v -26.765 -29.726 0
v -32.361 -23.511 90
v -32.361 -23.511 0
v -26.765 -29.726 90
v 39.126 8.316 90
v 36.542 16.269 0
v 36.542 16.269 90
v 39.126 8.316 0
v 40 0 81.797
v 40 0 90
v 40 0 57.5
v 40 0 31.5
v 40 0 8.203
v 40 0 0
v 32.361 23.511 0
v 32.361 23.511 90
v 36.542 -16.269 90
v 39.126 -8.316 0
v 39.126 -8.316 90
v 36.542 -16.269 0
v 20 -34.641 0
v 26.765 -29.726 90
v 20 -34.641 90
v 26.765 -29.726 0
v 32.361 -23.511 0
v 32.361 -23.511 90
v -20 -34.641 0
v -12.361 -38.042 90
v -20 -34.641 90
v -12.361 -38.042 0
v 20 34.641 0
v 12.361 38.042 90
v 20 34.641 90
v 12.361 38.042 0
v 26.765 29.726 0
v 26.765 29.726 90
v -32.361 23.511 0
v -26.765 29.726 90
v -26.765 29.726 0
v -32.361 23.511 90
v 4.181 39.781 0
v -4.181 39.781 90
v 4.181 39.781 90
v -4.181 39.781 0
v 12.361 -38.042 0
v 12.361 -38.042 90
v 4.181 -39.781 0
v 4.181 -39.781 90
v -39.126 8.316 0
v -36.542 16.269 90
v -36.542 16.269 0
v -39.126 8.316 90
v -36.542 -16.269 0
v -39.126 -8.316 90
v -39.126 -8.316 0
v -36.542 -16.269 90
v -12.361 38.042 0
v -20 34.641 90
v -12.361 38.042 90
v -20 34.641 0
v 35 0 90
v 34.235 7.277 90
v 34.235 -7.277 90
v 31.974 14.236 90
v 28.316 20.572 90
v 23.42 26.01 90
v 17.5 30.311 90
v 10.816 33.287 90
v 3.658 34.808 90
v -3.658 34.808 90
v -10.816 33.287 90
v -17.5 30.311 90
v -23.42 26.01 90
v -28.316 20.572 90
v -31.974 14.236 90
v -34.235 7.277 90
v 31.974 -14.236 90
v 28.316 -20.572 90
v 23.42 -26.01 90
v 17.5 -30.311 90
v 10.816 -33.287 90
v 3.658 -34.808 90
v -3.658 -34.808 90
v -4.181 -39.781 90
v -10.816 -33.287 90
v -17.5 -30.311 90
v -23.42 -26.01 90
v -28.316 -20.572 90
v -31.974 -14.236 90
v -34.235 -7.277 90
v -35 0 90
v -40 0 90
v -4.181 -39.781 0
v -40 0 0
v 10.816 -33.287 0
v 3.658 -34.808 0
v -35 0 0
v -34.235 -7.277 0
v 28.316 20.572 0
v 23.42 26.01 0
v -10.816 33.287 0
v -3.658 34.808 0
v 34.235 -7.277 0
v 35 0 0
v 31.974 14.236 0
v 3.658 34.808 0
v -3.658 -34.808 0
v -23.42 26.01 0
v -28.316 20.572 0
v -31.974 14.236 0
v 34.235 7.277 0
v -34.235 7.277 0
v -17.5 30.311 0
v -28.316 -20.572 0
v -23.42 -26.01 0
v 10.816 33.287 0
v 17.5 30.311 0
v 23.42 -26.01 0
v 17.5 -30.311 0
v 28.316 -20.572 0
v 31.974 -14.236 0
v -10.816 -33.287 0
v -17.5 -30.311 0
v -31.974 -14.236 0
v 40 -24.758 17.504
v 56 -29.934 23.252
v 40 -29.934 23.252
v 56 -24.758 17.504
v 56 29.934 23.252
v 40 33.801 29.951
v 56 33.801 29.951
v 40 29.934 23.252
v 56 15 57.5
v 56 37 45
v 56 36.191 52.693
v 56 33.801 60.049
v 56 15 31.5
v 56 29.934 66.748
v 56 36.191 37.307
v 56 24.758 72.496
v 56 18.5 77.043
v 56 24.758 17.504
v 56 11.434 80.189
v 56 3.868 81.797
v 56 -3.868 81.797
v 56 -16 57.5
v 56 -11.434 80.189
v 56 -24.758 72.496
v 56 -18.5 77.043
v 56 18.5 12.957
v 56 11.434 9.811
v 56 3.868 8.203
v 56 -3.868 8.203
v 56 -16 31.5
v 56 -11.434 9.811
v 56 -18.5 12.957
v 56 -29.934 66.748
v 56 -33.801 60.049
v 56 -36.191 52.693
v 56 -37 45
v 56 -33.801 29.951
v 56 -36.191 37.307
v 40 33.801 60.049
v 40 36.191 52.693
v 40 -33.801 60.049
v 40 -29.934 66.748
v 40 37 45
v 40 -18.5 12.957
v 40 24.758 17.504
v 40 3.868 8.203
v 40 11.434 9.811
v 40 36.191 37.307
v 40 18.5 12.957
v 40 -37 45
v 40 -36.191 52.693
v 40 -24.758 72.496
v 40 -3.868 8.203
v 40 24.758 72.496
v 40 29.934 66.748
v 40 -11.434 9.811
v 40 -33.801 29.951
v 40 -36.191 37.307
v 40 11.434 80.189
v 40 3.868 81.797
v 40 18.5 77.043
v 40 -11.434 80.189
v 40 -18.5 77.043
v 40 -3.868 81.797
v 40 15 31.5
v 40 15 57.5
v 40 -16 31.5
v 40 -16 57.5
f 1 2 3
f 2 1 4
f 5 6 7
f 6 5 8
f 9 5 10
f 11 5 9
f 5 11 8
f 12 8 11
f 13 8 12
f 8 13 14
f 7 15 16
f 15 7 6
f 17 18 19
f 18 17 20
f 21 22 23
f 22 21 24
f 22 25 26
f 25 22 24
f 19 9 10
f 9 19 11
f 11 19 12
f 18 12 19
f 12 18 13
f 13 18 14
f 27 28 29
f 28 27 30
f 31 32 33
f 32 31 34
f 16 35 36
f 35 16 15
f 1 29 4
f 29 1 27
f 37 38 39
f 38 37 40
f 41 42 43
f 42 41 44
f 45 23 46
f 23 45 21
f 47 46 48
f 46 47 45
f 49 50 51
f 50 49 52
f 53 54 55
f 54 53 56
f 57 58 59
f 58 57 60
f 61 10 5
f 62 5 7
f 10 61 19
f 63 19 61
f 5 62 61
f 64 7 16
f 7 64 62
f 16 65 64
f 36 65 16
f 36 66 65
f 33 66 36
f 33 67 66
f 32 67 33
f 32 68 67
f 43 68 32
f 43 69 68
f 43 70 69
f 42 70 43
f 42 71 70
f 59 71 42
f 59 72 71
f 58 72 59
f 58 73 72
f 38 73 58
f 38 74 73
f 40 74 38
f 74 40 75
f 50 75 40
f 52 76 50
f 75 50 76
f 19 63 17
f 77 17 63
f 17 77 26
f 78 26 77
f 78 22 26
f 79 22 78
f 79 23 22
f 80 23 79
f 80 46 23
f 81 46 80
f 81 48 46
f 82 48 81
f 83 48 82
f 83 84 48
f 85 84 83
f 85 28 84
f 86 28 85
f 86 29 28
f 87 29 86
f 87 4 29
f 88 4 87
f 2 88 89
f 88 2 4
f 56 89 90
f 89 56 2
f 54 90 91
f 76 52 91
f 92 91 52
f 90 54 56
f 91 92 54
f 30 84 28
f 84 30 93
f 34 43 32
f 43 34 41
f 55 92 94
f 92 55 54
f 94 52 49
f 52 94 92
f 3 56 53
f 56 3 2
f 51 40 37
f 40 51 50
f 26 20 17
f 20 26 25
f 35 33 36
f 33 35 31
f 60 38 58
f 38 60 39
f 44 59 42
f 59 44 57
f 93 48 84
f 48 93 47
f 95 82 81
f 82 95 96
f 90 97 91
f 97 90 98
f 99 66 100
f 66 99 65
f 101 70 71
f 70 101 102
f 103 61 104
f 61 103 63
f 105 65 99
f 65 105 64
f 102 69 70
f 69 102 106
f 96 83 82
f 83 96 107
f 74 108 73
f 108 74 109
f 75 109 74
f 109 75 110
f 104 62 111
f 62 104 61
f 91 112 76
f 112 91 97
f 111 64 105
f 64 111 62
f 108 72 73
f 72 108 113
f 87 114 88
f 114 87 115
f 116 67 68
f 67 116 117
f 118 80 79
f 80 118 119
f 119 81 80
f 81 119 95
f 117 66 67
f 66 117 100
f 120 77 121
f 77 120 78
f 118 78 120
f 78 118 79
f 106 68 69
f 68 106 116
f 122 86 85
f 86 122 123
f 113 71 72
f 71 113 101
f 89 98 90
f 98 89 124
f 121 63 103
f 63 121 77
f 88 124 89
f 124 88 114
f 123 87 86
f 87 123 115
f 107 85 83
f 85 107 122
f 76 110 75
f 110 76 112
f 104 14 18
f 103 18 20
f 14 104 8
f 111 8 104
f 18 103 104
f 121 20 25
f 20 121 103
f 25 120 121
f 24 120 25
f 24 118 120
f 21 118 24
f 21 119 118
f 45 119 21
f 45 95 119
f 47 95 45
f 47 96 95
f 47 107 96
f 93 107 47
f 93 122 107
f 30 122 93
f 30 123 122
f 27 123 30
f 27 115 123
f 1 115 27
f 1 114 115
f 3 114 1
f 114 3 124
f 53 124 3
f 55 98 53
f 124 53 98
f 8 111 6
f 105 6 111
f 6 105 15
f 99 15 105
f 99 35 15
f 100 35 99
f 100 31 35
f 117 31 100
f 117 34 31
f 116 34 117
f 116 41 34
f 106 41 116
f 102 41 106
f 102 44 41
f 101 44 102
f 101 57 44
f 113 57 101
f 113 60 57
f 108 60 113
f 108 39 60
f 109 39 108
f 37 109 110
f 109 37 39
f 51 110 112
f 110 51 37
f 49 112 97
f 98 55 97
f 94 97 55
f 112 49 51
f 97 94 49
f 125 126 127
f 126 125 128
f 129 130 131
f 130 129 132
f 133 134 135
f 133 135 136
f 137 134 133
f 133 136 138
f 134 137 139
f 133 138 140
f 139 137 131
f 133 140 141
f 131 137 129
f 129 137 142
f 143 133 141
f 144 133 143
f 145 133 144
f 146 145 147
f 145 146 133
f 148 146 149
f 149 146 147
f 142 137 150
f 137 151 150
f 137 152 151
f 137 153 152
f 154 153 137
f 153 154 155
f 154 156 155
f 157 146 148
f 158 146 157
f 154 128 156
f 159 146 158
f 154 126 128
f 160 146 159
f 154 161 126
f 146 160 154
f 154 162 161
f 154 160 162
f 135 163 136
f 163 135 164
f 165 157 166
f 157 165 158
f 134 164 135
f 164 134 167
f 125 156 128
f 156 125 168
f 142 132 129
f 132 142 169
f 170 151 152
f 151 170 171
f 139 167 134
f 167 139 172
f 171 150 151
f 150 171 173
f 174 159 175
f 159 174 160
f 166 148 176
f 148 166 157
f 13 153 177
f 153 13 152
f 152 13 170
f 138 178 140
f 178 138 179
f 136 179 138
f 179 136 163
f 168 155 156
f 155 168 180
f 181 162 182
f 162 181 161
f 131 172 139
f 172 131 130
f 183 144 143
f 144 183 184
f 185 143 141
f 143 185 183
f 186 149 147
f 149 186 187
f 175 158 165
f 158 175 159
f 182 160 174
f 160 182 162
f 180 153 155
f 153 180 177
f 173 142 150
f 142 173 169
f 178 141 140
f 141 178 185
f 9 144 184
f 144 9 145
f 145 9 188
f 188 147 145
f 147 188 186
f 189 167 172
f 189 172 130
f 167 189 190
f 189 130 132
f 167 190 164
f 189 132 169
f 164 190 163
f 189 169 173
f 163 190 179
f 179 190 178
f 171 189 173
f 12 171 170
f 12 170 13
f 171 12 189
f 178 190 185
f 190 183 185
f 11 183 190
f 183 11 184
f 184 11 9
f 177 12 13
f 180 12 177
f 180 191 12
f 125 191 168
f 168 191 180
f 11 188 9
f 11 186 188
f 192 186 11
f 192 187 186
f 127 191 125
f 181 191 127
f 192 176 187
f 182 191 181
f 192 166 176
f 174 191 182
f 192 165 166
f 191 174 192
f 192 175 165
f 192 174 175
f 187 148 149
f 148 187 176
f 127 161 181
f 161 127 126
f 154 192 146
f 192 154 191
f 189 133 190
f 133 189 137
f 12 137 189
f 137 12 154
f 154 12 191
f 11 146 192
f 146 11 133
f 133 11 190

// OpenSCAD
// =========================================
// OpenSCAD Mug Design (Specified Orientation)
// =========================================

// --- Global Dimensions ---
MUG_OD = 80;      // Outer Diameter of Mug (mm)
MUG_RD = MUG_OD / 2; // Outer Radius of Mug (mm)
MUG_ID = 70;      // Inner Diameter of Mug (mm)
MUG_RD_INNER = MUG_ID / 2; // Inner Radius of Mug (mm)

WALL_THICKNESS = MUG_RD - MUG_RD_INNER; // 5mm

TOTAL_HEIGHT = 90;   // Total height of the mug (mm)
BASE_THICKNESS = 6;  // Thickness of the base (mm)
WALL_HEIGHT = TOTAL_HEIGHT - BASE_THICKNESS; // Height of the cylindrical walls (84mm)


// --- Handle Dimensions ---
HANDLE_INNER_H = 30;     // Internal height of handle (Z)
HANDLE_INNER_W = 25;     // Internal width/depth of handle (Y)

// Estimate overall outer dimensions for D-shape based on internal size.
// We need a minimum structural thickness around the inner space.
HANDLE_OUTER_RADIUS = 37; // Outer radius estimate, must connect to R=40 mug wall
HANDLE_ATTACHMENT_THICKNESS = 15; // Thickness of the handle section connecting into the side wall


// =========================================
// 1. MUG BODY GENERATION
// =========================================

module generate_mug() {
    difference() {
        // A. Outer Shell (Solid Block)
        union() {
            // Base Plate: Solid disk at the bottom
            cylinder(h = BASE_THICKNESS, r = MUG_RD); 
            
            // Side Walls: Cylinder from base up to TOTAL_HEIGHT
            translate([0, 0, BASE_THICKNESS]) {
                difference() {
                    cylinder(h = WALL_HEIGHT, r = MUG_RD); // Outer cylinder segment
                    cylinder(h = WALL_HEIGHT + 1, r = MUG_RD_INNER); // Void cutout
                }
            }
        }

        // B. Internal Void Cutout (The liquid space)
        translate([0, 0, -1]) { // Offset slightly to ensure clean cut through the base/walls
             cylinder(h = TOTAL_HEIGHT + 2, r = MUG_RD_INNER);
        }
    }
}

// =========================================
// 2. HANDLE GENERATION AND PLACEMENT
// =========================================

module generate_handle() {
    // The handle will be placed on the side wall (e.g., +X direction).
    // We define a D-shape cross section that is extruded along the X-axis (depth of attachment).
    
    // Cross-section definition in YZ plane: 
    difference() {
        // Outer Shape (Semi-Circle based)
        circle(r = HANDLE_OUTER_RADIUS); // Defines a full circle for simplicity, we will use half later.

        translate([0, 0, 0]) {
            linear_extrude(height = HANDLE_ATTACHMENT_THICKNESS + 1) // Extrudes the D-shape along X axis (depth into wall)
            difference() {
                // Outer semi-circle shape (relative to the cup's surface at R=40)
                translate([HANDLE_OUTER_RADIUS, 0, 0]) circle(r = HANDLE_OUTER_RADIUS);

                // Inner Rectangular Cutout: This creates the D-shape.
                // We define the cutout centered relative to its own local origin.
                translate([- (HANDLE_INNER_W / 2), - (HANDLE_INNER_H / 2), 0])
                    cube([HANDLE_INNER_W + 1, HANDLE_INNER_H + 1, HANDLE_ATTACHMENT_THICKNESS]); 
            }
        }
    }
}

module attach_handle() {
    // Position the handle on the side corresponding to the positive X-axis.
    // We place its center at (40mm, 0, 90/2).
    translate([MUG_RD, 0, TOTAL_HEIGHT / 2]) {
        rotate([90, 0, 0]) // Rotate so that the attached flat face is perpendicular to X axis
        scale([1, -1, 1])   // Correcting orientation after rotation if needed (though usually unnecessary for translation)

        // We redefine the handle module placement logic here for correct mounting.
        // The handle's cross-section needs to be defined such that its straight side is flush with R=40.

        difference() {
             // Outer Shape: Semi-circle centered at (X_start, Y_start)
            translate([0, 0, 0]) 
                rotate([0, 90, 0]) // Rotate so the straight side is facing 'out' from X=40
                    cylinder(h = HANDLE_ATTACHMENT_THICKNESS + 1, r = HANDLE_OUTER_RADIUS);

            // Inner Cutout (The void space for fingers)
            translate([0, -HANDLE_INNER_W / 2, -(HANDLE_INNER_H / 2)]) // Centering the cutout relative to the handle's local frame
                cube([HANDLE_ATTACHMENT_THICKNESS + 1, HANDLE_INNER_W + 1, HANDLE_INNER_H + 1]);

            // Cutout of material that would intersect the mug body (Ensuring manifold connection)
             translate([0, -WALL_THICKNESS/2, -(HANDLE_INNER_H / 2)]) 
                cube([HANDLE_ATTACHMENT_THICKNESS + 1, WALL_THICKNESS * 2 , HANDLE_INNER_H + 1]); 

        }
    }
}


// =========================================
// 3. FINAL ASSEMBLY (UNION)
// =========================================

union() {
    generate_mug();
    attach_handle();
}
